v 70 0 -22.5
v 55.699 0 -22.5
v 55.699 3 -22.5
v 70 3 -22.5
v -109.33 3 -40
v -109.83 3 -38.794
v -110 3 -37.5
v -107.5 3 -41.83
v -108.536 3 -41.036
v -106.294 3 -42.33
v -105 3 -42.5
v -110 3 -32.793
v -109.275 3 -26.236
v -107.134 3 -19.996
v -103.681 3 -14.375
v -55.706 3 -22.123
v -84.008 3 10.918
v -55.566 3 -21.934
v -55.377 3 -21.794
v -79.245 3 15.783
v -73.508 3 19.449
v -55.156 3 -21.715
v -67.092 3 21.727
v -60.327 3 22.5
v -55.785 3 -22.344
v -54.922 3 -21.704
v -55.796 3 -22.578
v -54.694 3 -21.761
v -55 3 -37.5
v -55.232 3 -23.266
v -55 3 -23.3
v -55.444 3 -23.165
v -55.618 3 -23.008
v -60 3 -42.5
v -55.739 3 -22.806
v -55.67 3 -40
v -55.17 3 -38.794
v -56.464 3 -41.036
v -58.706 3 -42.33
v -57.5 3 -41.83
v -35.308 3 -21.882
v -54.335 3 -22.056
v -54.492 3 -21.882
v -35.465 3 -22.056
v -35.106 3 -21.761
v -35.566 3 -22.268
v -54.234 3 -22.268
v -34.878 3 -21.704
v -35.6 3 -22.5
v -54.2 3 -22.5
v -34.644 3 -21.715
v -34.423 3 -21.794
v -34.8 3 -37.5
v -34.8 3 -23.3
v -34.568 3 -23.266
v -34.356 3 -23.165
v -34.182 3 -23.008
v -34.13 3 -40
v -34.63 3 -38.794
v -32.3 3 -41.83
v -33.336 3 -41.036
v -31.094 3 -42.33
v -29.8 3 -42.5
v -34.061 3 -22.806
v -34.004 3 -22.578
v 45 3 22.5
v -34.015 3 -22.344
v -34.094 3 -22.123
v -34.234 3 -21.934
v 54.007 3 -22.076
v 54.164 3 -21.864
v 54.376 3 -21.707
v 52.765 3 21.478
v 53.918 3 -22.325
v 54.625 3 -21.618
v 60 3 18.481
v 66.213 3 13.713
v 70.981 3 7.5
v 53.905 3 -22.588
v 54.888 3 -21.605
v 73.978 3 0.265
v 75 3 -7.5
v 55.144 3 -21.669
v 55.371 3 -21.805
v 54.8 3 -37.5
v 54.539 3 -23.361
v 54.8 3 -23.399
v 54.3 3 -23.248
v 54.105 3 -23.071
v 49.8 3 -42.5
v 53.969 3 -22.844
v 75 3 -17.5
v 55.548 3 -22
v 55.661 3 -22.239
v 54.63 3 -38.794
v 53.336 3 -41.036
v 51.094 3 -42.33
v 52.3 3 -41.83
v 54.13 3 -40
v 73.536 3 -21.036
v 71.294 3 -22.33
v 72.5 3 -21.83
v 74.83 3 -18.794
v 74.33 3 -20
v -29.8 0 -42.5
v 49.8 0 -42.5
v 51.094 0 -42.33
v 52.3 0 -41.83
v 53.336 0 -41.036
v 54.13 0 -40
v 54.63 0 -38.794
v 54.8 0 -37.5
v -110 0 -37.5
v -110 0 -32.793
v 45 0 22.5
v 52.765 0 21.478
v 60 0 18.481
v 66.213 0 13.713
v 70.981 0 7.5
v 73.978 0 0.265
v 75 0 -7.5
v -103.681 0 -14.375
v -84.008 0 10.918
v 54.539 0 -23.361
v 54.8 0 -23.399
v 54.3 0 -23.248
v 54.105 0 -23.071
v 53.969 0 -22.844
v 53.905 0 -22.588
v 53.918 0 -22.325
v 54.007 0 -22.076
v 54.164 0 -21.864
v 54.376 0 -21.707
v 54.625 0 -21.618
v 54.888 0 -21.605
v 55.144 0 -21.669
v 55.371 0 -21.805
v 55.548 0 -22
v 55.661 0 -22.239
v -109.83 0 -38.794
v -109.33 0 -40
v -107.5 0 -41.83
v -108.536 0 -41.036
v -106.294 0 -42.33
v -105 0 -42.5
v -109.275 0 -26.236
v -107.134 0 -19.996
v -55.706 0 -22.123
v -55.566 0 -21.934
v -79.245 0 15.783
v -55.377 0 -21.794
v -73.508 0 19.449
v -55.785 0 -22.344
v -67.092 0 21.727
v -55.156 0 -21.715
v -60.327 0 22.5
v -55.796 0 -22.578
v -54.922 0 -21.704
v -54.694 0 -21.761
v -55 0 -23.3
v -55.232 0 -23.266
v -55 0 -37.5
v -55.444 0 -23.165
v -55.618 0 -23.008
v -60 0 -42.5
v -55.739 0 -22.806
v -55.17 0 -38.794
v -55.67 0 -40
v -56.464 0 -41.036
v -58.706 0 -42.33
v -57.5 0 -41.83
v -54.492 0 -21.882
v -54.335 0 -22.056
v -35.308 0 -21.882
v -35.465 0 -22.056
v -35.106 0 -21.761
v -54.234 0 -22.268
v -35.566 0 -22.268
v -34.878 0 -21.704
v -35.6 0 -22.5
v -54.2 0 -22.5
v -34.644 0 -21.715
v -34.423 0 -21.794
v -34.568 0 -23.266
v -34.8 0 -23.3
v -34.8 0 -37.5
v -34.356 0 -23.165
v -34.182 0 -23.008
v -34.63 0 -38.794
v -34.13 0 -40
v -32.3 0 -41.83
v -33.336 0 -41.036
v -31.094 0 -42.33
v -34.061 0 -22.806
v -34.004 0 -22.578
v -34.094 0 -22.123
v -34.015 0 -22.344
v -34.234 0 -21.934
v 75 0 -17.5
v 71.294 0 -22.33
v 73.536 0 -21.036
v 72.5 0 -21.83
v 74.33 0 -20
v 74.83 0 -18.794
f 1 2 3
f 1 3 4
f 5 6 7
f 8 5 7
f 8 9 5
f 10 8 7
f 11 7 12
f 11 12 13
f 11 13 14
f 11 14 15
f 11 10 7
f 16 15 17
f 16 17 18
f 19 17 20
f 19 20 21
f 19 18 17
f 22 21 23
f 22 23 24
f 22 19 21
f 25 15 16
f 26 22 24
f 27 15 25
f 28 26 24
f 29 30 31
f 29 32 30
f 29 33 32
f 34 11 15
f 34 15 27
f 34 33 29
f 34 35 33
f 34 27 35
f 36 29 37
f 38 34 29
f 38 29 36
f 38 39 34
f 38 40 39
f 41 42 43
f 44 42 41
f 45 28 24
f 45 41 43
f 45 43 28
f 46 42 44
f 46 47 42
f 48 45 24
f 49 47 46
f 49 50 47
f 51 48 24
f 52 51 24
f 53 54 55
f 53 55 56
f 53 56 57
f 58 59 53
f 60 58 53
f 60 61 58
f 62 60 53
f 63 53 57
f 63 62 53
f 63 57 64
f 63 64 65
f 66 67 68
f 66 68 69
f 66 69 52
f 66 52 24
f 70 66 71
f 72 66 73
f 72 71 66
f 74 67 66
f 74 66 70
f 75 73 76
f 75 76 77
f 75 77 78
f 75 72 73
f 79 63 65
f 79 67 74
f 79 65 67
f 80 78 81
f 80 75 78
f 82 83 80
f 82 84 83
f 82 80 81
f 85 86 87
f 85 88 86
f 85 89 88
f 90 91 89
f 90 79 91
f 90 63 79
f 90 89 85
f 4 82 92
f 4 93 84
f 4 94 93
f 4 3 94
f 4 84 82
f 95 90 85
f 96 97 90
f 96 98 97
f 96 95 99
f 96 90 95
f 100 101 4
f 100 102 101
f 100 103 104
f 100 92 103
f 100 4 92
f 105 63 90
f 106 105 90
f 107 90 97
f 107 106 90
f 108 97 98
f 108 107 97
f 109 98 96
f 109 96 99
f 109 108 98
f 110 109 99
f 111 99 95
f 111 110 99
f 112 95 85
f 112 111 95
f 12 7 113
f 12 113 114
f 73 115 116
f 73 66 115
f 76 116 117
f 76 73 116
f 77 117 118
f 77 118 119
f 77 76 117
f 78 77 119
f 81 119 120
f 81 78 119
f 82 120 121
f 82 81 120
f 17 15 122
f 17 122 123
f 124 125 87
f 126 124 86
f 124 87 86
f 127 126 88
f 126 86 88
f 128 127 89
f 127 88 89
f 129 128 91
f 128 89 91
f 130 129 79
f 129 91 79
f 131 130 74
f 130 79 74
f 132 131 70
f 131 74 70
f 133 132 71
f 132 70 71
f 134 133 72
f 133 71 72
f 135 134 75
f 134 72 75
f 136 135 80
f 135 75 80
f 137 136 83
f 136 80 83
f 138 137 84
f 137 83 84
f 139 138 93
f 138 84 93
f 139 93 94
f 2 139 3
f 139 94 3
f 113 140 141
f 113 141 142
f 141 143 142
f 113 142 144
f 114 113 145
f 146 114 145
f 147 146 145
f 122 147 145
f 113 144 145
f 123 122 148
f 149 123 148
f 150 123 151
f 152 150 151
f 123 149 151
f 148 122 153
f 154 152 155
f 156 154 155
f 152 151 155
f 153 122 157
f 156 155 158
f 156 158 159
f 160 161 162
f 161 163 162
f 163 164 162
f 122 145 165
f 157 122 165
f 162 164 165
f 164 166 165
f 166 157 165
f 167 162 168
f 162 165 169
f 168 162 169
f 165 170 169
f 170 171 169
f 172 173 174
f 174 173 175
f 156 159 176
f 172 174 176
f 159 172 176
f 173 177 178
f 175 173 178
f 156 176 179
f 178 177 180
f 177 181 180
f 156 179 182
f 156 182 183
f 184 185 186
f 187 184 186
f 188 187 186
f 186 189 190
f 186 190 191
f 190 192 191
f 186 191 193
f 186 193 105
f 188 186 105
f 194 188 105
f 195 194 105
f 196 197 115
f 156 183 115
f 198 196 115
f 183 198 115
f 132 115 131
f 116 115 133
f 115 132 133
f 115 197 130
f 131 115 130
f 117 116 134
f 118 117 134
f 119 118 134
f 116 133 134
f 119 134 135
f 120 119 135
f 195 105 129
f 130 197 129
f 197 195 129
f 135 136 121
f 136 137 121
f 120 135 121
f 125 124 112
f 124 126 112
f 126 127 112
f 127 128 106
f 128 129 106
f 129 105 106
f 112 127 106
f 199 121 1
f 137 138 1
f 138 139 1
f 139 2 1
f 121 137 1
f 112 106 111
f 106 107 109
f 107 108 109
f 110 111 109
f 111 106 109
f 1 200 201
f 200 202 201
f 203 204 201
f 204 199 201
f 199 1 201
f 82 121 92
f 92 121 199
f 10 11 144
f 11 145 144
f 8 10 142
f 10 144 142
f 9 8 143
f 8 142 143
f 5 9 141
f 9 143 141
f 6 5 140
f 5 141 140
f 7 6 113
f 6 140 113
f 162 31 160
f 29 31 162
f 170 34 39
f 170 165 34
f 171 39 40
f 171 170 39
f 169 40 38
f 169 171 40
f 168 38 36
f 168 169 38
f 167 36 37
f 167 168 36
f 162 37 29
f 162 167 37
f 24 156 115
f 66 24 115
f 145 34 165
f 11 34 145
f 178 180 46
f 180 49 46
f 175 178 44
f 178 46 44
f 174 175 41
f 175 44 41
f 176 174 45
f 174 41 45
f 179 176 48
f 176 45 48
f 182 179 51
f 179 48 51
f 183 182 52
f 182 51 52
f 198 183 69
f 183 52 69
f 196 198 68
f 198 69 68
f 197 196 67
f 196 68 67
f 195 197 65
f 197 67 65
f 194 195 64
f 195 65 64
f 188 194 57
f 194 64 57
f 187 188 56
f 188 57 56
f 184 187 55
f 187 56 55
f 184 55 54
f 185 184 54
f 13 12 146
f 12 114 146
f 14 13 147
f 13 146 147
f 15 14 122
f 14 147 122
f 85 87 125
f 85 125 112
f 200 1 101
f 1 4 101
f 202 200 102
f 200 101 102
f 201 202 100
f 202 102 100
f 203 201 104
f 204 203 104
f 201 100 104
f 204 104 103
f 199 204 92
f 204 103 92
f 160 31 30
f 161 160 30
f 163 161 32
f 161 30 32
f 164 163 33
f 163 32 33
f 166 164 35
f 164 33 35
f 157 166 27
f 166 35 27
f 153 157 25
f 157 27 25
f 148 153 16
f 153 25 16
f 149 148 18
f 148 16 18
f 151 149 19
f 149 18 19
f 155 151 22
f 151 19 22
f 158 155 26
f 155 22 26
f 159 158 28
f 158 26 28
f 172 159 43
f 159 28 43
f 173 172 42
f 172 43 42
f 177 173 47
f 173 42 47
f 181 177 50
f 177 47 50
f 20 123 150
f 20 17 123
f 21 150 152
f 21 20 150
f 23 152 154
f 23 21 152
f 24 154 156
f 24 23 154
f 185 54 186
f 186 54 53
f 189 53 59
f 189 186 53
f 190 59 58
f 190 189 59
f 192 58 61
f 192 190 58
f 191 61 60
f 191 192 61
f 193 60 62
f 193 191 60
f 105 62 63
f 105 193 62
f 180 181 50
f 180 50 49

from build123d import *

# Parameters (mm, degrees)
SKETCH1_W           = 150
SKETCH1_H           = 45
BOSS_EXTRUDE1_DEPTH = 3
FILLET1_R           = 30
SKETCH2_W           = 89.6
SKETCH2_H           = 20
BOSS_EXTRUDE2_DEPTH = 3
FILLET2_R           = 30
SKETCH3_R           = 0.8
SKETCH3_R_2         = 0.899402105
CUT_EXTRUDE1_DEPTH  = 118.962917902
FILLET3_R           = 5


with BuildPart() as part:
    # Sketch1 → Boss-Extrude1 (new body)
    with BuildSketch(Plane(origin=(0, 0, 0), x_dir=(1, 0, 0), z_dir=(0, 1, 0))):
        Rectangle(SKETCH1_W, SKETCH1_H)
    extrude(amount=BOSS_EXTRUDE1_DEPTH)

    # Fillet1
    fillet1_edges = [part.edges().sort_by_distance(p)[0] for p in [
        (75, 1.5, 22.5),
    ]]
    fillet(fillet1_edges, radius=FILLET1_R)

    # Sketch2 → Boss-Extrude2 (add)
    with BuildSketch(Plane(origin=(0, 3, 0), x_dir=(1, 0, 0), z_dir=(0, 1, 0))):
        Polygon((-75, 22.5), (-55, 22.5), (-55, 42.5), (-110, 42.5), (-110, 22.5), align=None)
        Polygon((-75, -22.5), (-75, 22.5), (-110, 22.5), align=None)
        with Locations((10, 32.5)):
            Rectangle(SKETCH2_W, SKETCH2_H)
    extrude(amount=-BOSS_EXTRUDE2_DEPTH)

    # Fillet2
    fillet2_edges = [part.edges().sort_by_distance(p)[0] for p in [
        (-110, 1.5, -22.5),
        (-75, 1.5, 22.5),
    ]]
    fillet(fillet2_edges, radius=FILLET2_R)

    # Sketch3 → Cut-Extrude1 (cut, through all)
    with BuildSketch(Plane(origin=(0, 3, 0), x_dir=(1, 0, 0), z_dir=(0, 1, 0))):
        with Locations((-55, 22.5)):
            Circle(SKETCH3_R)
        with Locations((-34.8, 22.5)):
            Circle(SKETCH3_R)
        with Locations((54.8, 22.5)):
            Circle(SKETCH3_R_2)
    extrude(amount=-CUT_EXTRUDE1_DEPTH, mode=Mode.SUBTRACT)

    # Fillet3
    fillet3_edges = [part.edges().sort_by_distance(p)[0] for p in [
        (-55, 1.5, -42.5),
        (-110, 1.5, -42.5),
        (-34.8, 1.5, -42.5),
        (54.8, 1.5, -42.5),
        (75, 1.5, -22.5),
    ]]
    fillet(fillet3_edges, radius=FILLET3_R)


solid = part.part
